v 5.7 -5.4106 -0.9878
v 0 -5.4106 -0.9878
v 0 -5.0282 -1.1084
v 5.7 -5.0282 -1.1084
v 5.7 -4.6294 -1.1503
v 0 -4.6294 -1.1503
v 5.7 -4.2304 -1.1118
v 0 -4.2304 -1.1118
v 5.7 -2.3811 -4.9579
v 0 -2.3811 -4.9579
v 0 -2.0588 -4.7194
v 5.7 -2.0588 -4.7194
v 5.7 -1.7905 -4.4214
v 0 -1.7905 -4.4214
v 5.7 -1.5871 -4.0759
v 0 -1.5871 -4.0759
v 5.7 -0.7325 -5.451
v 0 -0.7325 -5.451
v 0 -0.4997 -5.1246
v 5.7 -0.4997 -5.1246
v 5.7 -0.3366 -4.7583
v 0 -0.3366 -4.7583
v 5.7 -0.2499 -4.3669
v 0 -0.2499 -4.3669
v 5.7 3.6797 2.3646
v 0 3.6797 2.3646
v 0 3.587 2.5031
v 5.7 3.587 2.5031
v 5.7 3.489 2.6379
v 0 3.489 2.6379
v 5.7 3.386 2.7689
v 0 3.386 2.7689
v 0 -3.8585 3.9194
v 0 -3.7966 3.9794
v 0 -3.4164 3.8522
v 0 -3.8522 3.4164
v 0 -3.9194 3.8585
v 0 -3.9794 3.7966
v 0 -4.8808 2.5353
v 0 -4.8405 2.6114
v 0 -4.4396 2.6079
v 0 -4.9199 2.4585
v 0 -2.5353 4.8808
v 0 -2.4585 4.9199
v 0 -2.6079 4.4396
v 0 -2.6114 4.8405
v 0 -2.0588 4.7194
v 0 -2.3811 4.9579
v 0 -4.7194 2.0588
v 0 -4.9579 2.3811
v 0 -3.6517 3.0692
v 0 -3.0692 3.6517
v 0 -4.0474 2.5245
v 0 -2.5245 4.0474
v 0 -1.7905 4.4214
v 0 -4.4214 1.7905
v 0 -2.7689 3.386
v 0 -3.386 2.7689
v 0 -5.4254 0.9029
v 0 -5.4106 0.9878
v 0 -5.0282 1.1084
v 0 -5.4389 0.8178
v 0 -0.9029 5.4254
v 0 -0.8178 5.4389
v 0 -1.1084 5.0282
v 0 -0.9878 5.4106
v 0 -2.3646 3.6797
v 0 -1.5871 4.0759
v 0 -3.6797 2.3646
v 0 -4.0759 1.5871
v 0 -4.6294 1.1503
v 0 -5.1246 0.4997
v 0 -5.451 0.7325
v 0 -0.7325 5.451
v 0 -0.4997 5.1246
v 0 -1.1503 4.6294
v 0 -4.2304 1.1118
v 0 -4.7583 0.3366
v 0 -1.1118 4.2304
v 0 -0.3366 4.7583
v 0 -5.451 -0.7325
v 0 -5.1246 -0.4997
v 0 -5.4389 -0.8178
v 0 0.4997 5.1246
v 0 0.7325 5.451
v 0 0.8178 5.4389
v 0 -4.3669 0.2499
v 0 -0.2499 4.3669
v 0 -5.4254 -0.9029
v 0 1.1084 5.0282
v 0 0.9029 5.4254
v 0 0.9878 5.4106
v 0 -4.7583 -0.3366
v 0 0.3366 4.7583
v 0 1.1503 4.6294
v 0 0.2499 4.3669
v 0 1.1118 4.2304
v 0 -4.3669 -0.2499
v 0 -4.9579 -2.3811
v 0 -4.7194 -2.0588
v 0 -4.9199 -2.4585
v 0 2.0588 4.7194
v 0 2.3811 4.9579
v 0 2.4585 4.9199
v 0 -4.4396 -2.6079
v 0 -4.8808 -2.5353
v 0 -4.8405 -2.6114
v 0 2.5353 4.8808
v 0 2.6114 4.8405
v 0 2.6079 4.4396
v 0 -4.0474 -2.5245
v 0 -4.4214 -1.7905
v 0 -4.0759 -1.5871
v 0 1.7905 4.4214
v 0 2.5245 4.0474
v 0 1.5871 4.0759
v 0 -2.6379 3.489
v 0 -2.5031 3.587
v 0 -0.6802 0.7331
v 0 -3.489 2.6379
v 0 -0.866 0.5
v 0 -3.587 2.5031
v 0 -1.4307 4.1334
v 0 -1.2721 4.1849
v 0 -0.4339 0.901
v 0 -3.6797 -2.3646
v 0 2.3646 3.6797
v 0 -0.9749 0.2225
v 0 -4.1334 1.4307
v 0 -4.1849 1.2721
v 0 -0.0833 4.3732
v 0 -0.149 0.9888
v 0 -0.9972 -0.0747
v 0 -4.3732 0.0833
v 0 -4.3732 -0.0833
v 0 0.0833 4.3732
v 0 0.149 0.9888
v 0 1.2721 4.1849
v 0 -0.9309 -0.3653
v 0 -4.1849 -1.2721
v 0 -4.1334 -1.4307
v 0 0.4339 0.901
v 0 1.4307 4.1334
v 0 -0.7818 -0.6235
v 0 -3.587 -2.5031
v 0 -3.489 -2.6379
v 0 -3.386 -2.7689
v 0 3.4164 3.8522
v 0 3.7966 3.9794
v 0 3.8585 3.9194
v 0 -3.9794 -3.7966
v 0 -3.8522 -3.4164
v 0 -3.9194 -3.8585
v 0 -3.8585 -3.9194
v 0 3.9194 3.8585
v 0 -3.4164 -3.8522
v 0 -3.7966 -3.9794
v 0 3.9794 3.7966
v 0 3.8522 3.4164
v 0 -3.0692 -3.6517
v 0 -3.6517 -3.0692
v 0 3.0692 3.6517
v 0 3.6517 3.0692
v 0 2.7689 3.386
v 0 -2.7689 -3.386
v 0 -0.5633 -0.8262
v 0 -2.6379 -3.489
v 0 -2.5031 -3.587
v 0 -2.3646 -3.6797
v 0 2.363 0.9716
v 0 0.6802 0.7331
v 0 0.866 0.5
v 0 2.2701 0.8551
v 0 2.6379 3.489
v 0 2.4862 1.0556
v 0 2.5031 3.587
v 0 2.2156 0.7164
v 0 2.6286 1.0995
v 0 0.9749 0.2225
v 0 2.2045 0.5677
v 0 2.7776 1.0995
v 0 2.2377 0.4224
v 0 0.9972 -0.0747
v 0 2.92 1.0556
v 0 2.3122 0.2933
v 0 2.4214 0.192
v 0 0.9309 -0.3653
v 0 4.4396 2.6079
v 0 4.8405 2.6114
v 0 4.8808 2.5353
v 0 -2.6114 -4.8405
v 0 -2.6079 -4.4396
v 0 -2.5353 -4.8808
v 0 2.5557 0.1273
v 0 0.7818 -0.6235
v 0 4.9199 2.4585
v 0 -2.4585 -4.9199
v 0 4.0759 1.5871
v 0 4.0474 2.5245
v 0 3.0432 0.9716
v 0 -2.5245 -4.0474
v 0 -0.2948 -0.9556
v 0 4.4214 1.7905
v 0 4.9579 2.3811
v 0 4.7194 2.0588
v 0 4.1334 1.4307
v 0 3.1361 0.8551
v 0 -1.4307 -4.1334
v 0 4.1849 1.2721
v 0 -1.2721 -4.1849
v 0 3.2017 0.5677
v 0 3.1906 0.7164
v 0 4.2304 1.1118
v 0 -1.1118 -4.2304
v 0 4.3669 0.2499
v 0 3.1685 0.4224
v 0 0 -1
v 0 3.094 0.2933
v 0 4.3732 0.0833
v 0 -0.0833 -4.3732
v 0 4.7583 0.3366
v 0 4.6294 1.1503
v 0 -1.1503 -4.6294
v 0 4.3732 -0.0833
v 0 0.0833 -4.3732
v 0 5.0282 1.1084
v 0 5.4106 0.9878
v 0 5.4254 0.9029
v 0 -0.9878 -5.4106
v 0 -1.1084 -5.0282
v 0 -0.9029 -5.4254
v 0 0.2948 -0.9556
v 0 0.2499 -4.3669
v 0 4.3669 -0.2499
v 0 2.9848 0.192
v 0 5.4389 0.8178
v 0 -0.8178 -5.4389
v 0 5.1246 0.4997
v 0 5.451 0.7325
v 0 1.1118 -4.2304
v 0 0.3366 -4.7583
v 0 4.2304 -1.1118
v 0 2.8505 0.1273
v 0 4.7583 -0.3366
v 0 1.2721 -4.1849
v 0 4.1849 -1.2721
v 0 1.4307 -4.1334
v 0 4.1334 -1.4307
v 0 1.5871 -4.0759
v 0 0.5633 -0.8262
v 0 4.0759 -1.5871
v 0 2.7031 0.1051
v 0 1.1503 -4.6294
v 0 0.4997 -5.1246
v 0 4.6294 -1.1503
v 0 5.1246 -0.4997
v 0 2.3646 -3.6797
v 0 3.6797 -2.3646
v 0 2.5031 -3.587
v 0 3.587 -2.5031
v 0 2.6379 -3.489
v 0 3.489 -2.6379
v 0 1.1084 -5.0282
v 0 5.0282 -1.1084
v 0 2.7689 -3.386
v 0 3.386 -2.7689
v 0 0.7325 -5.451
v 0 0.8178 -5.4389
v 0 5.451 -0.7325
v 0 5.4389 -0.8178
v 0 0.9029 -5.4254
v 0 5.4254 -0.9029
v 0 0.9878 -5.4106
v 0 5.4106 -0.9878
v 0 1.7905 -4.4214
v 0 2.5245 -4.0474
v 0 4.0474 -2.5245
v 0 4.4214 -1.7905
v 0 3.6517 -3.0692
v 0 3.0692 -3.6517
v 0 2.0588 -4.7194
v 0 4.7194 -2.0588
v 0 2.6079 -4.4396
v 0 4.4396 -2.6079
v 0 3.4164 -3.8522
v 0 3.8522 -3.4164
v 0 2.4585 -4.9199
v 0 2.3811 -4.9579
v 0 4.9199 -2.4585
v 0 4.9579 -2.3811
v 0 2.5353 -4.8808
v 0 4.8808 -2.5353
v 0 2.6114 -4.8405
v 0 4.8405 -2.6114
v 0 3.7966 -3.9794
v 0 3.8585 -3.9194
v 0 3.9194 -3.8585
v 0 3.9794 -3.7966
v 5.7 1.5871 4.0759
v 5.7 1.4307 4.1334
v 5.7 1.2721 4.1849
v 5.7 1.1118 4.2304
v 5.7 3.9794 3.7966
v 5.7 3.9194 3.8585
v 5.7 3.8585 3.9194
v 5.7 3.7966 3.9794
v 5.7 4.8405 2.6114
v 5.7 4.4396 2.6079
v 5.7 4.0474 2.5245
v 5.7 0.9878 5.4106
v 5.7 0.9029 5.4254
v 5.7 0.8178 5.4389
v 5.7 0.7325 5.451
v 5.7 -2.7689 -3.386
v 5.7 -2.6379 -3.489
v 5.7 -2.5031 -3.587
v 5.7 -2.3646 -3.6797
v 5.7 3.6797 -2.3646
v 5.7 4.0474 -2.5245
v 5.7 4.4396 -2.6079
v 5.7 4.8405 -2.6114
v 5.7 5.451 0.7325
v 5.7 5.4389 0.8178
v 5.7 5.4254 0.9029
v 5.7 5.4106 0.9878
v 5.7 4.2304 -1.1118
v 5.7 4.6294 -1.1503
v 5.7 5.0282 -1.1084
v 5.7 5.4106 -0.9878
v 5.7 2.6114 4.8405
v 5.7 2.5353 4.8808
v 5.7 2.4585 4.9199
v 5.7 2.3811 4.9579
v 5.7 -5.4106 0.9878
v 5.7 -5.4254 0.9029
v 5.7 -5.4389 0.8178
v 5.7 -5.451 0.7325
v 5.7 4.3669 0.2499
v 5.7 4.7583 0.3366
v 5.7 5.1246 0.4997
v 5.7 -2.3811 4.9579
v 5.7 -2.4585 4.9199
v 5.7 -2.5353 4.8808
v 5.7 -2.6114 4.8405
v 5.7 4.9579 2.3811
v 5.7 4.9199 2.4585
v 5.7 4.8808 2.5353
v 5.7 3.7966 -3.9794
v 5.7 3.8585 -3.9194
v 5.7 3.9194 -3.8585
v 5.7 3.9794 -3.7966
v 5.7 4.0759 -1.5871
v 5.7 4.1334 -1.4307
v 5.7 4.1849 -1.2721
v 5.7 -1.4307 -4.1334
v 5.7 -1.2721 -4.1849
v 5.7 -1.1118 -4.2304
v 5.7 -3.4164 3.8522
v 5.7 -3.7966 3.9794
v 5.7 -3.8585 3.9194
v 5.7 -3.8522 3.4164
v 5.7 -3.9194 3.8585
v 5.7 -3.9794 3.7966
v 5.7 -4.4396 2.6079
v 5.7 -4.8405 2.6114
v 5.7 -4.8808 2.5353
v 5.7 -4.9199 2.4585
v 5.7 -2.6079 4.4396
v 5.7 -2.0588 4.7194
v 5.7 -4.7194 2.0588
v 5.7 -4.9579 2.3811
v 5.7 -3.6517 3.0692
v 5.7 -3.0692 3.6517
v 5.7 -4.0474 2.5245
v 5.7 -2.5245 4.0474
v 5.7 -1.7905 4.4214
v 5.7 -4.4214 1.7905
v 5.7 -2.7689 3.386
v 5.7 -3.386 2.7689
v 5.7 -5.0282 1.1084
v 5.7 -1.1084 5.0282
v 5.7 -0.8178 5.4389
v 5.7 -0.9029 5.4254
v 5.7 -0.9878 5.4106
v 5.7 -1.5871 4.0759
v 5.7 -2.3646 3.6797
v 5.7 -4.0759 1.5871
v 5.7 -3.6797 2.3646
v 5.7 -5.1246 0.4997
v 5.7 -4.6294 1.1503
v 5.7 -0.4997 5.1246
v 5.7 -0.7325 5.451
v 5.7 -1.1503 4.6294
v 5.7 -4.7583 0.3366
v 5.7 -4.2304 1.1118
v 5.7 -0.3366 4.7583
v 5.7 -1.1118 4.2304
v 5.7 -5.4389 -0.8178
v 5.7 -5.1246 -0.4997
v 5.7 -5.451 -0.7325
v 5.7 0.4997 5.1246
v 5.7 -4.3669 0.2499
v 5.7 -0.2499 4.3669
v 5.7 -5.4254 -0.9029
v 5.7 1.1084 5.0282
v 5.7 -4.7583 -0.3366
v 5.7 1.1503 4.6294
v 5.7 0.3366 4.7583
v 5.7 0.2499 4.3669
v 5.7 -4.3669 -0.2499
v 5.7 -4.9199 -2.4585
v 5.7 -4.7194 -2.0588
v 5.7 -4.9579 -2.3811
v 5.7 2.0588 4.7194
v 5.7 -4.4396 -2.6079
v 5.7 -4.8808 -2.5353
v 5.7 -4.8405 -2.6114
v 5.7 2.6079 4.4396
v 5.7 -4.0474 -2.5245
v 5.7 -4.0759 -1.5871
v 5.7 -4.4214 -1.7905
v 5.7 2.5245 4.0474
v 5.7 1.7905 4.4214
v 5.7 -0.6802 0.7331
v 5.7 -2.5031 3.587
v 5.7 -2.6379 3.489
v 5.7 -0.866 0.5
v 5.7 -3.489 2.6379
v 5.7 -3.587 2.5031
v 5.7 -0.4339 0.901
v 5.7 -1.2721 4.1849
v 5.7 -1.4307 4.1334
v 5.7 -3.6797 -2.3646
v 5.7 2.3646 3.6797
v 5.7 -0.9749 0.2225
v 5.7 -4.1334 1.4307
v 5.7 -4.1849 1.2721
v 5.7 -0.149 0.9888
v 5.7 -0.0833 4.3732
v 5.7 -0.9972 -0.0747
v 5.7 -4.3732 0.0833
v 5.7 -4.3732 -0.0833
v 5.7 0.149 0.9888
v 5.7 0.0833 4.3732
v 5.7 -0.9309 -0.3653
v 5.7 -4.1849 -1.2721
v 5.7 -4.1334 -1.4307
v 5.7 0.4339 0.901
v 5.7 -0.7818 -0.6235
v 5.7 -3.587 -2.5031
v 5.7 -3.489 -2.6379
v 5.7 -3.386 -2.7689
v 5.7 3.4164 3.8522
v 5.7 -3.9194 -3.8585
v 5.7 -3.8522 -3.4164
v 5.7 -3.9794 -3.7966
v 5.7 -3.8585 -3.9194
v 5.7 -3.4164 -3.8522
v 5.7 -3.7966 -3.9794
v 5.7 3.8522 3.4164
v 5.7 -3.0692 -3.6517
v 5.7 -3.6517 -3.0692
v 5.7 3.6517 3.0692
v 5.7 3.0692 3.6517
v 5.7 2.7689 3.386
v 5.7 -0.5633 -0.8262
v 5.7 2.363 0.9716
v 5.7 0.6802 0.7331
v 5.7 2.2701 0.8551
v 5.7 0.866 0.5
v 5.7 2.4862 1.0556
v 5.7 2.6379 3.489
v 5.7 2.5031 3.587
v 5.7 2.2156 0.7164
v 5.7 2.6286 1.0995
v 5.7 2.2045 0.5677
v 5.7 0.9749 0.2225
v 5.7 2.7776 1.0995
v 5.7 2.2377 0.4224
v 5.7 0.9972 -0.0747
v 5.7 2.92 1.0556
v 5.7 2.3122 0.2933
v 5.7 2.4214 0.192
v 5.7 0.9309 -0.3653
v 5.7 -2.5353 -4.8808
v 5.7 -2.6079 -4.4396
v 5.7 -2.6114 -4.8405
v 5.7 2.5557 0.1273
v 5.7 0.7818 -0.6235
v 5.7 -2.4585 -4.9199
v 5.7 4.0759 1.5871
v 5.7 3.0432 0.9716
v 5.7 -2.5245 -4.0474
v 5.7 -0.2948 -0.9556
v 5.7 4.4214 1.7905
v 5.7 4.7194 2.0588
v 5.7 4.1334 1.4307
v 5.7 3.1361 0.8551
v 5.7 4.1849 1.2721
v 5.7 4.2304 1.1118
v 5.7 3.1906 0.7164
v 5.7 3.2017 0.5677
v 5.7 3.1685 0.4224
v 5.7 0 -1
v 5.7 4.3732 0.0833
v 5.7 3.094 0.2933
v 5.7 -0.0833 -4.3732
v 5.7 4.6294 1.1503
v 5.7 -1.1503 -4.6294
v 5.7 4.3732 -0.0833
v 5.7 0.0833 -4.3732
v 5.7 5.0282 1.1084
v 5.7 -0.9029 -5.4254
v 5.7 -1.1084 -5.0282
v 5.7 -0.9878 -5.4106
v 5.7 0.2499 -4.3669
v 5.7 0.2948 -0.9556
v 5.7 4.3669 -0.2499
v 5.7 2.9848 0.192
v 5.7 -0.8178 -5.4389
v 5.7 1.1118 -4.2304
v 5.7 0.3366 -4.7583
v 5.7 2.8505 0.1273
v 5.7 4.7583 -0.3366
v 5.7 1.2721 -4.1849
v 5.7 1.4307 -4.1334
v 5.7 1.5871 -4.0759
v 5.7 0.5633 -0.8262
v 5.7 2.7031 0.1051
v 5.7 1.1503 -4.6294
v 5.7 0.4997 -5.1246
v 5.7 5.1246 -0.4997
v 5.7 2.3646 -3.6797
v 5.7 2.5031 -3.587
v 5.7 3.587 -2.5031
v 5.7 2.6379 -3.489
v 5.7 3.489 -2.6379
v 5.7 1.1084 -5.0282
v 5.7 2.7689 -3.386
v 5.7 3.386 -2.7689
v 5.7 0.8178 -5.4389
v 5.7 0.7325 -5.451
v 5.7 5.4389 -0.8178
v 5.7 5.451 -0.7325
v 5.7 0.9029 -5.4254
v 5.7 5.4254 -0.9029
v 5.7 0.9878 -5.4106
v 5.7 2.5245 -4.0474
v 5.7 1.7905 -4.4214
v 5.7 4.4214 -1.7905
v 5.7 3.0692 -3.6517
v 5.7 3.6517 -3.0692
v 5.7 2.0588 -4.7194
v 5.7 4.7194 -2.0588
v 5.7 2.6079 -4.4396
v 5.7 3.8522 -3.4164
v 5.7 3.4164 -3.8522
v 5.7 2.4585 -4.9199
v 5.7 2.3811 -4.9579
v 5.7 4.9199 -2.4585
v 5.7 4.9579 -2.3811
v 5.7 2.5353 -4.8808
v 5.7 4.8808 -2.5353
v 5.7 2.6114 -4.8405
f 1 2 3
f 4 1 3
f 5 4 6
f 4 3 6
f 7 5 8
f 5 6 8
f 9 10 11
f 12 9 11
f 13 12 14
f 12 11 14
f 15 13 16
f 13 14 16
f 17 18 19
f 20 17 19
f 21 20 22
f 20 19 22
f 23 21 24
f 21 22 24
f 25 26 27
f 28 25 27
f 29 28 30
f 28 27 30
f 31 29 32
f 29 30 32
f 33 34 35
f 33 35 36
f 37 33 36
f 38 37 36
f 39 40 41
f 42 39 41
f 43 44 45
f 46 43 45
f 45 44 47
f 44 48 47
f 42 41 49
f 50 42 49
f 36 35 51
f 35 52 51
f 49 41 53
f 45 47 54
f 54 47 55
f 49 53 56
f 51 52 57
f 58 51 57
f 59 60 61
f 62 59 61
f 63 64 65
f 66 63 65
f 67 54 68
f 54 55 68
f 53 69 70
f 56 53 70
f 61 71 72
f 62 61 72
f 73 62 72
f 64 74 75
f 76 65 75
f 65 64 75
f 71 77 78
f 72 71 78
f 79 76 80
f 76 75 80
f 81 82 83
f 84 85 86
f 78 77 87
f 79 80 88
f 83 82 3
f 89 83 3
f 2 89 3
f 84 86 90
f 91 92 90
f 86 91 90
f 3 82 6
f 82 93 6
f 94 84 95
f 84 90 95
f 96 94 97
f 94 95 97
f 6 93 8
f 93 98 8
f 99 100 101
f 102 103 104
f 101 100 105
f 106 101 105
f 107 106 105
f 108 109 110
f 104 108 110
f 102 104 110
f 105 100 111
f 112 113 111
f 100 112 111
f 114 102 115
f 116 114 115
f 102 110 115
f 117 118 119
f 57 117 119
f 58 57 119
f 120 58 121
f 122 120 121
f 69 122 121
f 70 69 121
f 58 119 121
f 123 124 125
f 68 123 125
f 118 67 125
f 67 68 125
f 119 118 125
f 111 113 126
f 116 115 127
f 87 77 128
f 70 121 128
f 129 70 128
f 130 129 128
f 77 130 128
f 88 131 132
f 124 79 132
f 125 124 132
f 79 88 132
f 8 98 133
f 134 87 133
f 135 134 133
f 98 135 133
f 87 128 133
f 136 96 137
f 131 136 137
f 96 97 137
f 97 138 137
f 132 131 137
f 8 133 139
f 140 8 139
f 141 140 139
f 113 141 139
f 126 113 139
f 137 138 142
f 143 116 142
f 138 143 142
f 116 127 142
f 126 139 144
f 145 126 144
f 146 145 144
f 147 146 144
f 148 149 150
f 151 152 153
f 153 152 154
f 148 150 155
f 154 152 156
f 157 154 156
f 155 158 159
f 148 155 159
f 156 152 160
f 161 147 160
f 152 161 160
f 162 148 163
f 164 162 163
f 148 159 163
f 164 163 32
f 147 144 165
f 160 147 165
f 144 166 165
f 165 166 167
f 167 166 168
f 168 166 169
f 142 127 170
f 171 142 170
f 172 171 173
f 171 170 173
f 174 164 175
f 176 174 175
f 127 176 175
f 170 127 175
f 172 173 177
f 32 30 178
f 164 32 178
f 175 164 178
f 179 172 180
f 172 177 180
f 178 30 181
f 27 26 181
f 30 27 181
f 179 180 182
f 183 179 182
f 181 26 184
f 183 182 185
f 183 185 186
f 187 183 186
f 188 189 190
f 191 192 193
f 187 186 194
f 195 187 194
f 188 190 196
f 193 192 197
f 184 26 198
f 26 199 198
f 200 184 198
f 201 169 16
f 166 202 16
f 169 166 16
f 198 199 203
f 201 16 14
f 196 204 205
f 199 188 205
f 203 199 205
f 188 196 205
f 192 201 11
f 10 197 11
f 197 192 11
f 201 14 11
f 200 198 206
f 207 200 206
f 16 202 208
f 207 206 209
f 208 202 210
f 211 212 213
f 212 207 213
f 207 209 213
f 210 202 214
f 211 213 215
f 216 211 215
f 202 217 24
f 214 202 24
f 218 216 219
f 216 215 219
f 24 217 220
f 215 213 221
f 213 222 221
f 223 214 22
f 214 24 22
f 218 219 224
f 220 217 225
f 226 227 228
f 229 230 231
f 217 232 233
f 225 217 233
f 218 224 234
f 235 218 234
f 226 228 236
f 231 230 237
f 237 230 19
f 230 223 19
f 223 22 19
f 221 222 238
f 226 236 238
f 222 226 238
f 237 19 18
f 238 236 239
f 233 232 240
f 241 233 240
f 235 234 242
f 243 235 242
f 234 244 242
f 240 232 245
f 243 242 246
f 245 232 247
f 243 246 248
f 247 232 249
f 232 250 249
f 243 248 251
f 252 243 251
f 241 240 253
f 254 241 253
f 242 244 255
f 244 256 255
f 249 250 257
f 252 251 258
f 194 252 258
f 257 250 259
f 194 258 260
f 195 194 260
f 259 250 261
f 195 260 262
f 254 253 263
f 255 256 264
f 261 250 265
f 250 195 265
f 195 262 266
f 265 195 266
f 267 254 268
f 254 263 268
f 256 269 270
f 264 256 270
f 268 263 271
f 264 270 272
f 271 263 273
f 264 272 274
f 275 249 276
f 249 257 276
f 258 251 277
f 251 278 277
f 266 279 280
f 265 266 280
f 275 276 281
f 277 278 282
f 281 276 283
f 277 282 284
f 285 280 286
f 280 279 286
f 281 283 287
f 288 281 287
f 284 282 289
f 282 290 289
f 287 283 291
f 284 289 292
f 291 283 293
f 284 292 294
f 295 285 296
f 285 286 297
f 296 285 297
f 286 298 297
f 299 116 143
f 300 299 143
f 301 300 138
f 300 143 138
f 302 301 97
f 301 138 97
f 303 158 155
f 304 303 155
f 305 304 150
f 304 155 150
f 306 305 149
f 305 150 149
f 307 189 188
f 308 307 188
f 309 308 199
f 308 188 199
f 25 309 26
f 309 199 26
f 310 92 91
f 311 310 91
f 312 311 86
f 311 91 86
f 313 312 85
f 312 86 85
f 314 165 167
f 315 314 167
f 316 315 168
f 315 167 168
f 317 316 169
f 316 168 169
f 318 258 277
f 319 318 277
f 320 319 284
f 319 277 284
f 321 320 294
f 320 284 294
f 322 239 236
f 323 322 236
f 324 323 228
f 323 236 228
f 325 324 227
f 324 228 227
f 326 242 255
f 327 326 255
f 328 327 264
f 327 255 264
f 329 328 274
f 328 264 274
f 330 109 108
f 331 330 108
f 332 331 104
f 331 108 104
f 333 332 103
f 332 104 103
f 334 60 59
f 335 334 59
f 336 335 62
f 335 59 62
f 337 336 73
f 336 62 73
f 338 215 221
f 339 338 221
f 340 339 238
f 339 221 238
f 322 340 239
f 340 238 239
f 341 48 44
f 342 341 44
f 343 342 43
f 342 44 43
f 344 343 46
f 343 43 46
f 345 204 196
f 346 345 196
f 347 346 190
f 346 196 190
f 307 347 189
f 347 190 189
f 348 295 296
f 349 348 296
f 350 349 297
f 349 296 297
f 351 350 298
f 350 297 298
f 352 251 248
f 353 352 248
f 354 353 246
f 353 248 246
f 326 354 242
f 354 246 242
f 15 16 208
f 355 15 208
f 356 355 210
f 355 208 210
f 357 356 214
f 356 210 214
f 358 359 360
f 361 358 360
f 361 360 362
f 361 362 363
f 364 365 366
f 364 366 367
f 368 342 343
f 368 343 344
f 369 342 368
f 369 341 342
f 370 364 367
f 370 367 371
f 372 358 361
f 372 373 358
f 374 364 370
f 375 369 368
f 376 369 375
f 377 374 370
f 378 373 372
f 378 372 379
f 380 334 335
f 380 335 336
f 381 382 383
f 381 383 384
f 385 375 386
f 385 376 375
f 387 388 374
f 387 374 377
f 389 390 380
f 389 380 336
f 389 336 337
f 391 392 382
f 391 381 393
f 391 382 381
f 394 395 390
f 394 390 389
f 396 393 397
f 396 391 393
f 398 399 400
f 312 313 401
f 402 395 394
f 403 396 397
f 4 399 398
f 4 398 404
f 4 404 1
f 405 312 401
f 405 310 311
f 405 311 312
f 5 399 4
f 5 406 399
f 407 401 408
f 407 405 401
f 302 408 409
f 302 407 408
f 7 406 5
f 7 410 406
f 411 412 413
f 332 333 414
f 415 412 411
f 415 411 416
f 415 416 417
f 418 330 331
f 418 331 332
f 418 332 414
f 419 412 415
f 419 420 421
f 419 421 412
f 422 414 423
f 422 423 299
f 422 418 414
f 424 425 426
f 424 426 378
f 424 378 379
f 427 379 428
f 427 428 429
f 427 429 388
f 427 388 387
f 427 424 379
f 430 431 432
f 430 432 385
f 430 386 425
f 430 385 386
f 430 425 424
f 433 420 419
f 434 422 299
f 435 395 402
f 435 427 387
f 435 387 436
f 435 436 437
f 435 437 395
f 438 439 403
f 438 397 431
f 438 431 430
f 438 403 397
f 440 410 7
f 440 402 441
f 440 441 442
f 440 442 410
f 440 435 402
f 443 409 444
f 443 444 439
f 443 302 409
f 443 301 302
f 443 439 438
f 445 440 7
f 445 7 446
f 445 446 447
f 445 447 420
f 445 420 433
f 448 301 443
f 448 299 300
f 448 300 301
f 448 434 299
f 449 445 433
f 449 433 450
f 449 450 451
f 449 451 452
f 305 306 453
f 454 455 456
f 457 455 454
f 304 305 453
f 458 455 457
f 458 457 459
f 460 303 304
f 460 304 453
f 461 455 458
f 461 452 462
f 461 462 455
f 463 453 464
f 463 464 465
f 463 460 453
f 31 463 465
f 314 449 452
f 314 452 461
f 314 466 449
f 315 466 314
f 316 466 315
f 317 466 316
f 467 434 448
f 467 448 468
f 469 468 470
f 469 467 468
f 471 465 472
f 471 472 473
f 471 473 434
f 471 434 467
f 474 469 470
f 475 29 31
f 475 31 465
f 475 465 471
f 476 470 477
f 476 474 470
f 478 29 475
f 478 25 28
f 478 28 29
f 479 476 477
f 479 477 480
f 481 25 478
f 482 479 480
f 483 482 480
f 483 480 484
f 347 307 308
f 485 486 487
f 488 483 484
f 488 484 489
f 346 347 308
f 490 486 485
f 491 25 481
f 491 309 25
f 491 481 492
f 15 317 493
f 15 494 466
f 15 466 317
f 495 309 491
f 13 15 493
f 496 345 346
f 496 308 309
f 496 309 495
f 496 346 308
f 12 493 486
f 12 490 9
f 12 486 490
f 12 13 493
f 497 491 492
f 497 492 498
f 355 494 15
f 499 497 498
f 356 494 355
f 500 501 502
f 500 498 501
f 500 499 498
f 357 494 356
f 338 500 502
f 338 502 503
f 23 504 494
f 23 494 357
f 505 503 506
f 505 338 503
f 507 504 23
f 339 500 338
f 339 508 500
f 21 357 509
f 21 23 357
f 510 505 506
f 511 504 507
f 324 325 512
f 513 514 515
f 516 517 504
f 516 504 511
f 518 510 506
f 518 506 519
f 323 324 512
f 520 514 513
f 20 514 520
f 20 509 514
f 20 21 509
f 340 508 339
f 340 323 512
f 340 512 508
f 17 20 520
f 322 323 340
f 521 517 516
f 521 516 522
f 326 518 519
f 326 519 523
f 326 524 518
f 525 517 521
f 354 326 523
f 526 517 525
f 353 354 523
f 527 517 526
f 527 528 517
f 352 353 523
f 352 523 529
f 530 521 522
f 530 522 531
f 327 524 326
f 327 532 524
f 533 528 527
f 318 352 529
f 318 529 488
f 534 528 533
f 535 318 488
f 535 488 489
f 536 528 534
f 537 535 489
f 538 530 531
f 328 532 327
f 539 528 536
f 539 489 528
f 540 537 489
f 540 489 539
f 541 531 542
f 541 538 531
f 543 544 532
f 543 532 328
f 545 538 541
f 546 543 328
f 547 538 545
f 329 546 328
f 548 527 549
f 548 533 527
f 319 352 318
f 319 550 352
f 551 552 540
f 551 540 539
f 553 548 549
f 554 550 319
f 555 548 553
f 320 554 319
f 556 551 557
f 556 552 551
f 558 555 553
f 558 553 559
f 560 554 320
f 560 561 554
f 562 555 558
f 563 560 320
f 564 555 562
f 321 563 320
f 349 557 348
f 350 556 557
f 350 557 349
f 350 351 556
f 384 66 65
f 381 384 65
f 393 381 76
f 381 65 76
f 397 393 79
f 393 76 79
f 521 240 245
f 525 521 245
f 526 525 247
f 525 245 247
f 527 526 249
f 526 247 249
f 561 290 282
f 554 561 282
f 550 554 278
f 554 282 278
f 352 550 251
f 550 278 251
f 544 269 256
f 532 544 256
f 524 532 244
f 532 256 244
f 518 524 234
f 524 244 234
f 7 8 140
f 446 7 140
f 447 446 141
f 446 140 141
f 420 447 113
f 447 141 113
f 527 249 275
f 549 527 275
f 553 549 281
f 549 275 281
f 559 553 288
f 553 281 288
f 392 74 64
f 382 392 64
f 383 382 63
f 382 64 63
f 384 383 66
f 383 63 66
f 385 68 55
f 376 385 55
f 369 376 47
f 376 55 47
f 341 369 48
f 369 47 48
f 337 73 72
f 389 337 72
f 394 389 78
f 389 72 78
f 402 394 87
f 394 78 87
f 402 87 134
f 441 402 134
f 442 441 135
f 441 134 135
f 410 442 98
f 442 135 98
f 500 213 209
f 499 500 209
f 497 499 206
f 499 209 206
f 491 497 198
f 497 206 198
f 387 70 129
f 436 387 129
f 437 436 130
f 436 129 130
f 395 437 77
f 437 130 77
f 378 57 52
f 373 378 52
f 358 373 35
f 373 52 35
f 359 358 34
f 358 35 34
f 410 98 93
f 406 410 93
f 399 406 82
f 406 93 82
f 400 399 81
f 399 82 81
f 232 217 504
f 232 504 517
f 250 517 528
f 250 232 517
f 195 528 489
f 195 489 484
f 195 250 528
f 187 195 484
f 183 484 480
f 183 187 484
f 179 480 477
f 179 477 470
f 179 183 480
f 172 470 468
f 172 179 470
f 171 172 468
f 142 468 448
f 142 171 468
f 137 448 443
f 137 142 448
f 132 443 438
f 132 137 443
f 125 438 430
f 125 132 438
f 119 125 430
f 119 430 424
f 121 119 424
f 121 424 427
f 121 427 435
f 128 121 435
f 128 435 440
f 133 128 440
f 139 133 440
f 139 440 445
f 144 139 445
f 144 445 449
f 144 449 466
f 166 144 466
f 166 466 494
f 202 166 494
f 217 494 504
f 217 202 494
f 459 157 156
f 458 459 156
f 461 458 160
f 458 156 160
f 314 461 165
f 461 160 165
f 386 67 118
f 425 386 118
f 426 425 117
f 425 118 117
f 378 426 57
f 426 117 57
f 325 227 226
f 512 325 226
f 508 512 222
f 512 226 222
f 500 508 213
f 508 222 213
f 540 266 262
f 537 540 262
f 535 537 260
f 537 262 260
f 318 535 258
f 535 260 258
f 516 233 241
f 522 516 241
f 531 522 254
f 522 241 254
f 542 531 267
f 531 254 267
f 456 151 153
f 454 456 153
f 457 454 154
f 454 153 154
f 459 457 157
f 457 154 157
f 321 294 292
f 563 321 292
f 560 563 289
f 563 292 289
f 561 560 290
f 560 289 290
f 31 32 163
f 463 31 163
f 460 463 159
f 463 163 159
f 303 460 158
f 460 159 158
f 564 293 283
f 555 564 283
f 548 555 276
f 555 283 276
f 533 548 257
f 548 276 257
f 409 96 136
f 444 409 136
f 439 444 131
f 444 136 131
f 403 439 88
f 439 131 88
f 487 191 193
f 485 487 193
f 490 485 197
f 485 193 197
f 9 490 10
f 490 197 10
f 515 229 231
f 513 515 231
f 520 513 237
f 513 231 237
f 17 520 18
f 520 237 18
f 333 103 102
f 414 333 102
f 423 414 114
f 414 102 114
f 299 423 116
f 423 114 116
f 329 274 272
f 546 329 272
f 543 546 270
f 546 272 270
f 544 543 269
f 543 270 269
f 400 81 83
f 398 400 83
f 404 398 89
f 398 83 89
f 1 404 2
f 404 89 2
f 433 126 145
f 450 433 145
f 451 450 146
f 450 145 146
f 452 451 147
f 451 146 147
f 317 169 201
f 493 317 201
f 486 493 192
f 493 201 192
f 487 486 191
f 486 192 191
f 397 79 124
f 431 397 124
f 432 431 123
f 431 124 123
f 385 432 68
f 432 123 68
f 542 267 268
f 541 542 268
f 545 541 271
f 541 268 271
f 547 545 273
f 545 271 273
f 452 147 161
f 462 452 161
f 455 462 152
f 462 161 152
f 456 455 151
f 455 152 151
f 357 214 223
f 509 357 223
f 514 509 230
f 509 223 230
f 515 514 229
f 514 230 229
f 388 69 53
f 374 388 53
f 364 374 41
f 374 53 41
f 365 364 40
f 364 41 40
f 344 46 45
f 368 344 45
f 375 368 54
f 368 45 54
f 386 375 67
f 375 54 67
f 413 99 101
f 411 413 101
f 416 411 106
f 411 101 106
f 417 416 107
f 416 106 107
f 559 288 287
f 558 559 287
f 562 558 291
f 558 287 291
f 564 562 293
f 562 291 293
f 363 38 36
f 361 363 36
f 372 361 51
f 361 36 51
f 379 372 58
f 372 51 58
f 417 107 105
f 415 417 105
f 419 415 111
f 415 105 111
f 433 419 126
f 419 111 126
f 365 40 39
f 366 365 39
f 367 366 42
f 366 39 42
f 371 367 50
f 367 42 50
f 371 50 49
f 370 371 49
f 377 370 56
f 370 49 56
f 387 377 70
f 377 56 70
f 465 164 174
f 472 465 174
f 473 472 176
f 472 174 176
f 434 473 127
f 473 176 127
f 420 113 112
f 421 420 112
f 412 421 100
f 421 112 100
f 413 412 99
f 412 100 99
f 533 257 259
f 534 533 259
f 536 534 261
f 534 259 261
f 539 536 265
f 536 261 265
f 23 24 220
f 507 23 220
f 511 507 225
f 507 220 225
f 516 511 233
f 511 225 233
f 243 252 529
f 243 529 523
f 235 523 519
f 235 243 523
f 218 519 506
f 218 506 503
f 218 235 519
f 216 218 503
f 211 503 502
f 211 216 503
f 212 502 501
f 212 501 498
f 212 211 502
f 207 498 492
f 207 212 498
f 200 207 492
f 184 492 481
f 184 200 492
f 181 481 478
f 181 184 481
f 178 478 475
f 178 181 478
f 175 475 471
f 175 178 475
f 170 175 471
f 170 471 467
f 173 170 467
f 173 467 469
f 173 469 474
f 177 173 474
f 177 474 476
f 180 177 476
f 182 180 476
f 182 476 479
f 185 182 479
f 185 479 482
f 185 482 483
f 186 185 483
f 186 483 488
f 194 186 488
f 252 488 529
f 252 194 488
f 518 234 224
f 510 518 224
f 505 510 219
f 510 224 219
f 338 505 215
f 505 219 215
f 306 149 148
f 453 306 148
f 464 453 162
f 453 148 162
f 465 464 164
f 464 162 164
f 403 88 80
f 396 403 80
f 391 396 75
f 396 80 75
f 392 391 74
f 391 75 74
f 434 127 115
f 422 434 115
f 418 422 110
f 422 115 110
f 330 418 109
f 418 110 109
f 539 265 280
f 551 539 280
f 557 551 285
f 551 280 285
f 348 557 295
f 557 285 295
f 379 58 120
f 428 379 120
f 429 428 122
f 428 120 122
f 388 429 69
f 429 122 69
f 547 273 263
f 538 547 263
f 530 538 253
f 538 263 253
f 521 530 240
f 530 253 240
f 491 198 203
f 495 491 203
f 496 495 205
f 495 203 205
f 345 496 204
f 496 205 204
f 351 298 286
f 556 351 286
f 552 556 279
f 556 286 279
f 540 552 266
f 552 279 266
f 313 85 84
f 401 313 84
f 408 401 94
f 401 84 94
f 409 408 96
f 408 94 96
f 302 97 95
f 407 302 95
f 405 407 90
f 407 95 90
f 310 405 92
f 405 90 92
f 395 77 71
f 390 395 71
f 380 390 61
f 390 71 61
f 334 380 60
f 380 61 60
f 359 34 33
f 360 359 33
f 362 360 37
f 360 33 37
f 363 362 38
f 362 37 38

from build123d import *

# Parameters (mm, degrees)
SKETCH_7_R      = 1
SKETCH_7_R_2    = 0.5
EXTRUDE_3_DEPTH = 5.7


with BuildPart() as part:
    # 草图7 → 凸台-拉伸3 (new body)
    with BuildSketch(Plane(origin=(0, 0, 0), x_dir=(0, 0, -1), z_dir=(1, 0, 0))):
        with BuildLine():
            ThreePointArc((-5.451006848, 0.732478218), (-4.945547363, 0.408928549), (-4.366855207, 0.249903181))
            ThreePointArc((-4.366855207, 0.249903181), (-4.374, 0), (-4.366855207, -0.249903181))
            ThreePointArc((-4.366855207, -0.249903181), (-4.945547363, -0.408928549), (-5.451006848, -0.732478218))
            ThreePointArc((-5.451006848, -0.732478218), (-5.432285873, -0.860389558), (-5.410563801, -0.987825571))
            ThreePointArc((-5.410563801, -0.987825571), (-4.829860918, -1.139344021), (-4.23035043, -1.111760422))
            ThreePointArc((-4.23035043, -1.111760422), (-4.159921202, -1.351640333), (-4.075901771, -1.58710452))
            ThreePointArc((-4.075901771, -1.58710452), (-4.577129176, -1.917172343), (-4.957867366, -2.381081934))
            ThreePointArc((-4.957867366, -2.381081934), (-4.900535883, -2.496947749), (-4.840497071, -2.61143411))
            ThreePointArc((-4.840497071, -2.61143411), (-4.241394034, -2.576089659), (-3.679749479, -2.364597169))
            ThreePointArc((-3.679749479, -2.364597169), (-3.538640333, -2.570972694), (-3.38597067, -2.76894901))
            ThreePointArc((-3.38597067, -2.76894901), (-3.760669693, -3.23774995), (-3.979417283, -3.796608762))
            ThreePointArc((-3.979417283, -3.796608762), (-3.889087297, -3.889087297), (-3.796608762, -3.979417283))
            ThreePointArc((-3.796608762, -3.979417283), (-3.23774995, -3.760669693), (-2.76894901, -3.38597067))
            ThreePointArc((-2.76894901, -3.38597067), (-2.570972694, -3.538640333), (-2.364597169, -3.679749479))
            ThreePointArc((-2.364597169, -3.679749479), (-2.576089659, -4.241394034), (-2.61143411, -4.840497071))
            ThreePointArc((-2.61143411, -4.840497071), (-2.496947749, -4.900535883), (-2.381081934, -4.957867366))
            ThreePointArc((-2.381081934, -4.957867366), (-1.917172343, -4.577129176), (-1.58710452, -4.075901771))
            ThreePointArc((-1.58710452, -4.075901771), (-1.351640333, -4.159921202), (-1.111760422, -4.23035043))
            ThreePointArc((-1.111760422, -4.23035043), (-1.139344021, -4.829860918), (-0.987825571, -5.410563801))
            ThreePointArc((-0.987825571, -5.410563801), (-0.860389558, -5.432285873), (-0.732478218, -5.451006848))
            ThreePointArc((-0.732478218, -5.451006848), (-0.408928549, -4.945547363), (-0.249903181, -4.366855207))
            ThreePointArc((-0.249903181, -4.366855207), (0, -4.374), (0.249903181, -4.366855207))
            ThreePointArc((0.249903181, -4.366855207), (0.408928549, -4.945547363), (0.732478218, -5.451006848))
            ThreePointArc((0.732478218, -5.451006848), (0.860389558, -5.432285873), (0.987825571, -5.410563801))
            ThreePointArc((0.987825571, -5.410563801), (1.139344021, -4.829860918), (1.111760422, -4.23035043))
            ThreePointArc((1.111760422, -4.23035043), (1.351640333, -4.159921202), (1.58710452, -4.075901771))
            ThreePointArc((1.58710452, -4.075901771), (1.917172343, -4.577129176), (2.381081934, -4.957867366))
            ThreePointArc((2.381081934, -4.957867366), (2.496947749, -4.900535883), (2.61143411, -4.840497071))
            ThreePointArc((2.61143411, -4.840497071), (2.576089659, -4.241394034), (2.364597169, -3.679749479))
            ThreePointArc((2.364597169, -3.679749479), (2.570972694, -3.538640333), (2.76894901, -3.38597067))
            ThreePointArc((2.76894901, -3.38597067), (3.23774995, -3.760669693), (3.796608762, -3.979417283))
            ThreePointArc((3.796608762, -3.979417283), (3.889087297, -3.889087297), (3.979417283, -3.796608762))
            ThreePointArc((3.979417283, -3.796608762), (3.760669693, -3.23774995), (3.38597067, -2.76894901))
            ThreePointArc((3.38597067, -2.76894901), (3.538640333, -2.570972694), (3.679749479, -2.364597169))
            ThreePointArc((3.679749479, -2.364597169), (4.241394034, -2.576089659), (4.840497071, -2.61143411))
            ThreePointArc((4.840497071, -2.61143411), (4.900535883, -2.496947749), (4.957867366, -2.381081934))
            ThreePointArc((4.957867366, -2.381081934), (4.577129176, -1.917172343), (4.075901771, -1.58710452))
            ThreePointArc((4.075901771, -1.58710452), (4.159921202, -1.351640333), (4.23035043, -1.111760422))
            ThreePointArc((4.23035043, -1.111760422), (4.829860918, -1.139344021), (5.410563801, -0.987825571))
            ThreePointArc((5.410563801, -0.987825571), (5.432285873, -0.860389558), (5.451006848, -0.732478218))
            ThreePointArc((5.451006848, -0.732478218), (4.945547363, -0.408928549), (4.366855207, -0.249903181))
            ThreePointArc((4.366855207, -0.249903181), (4.374, 0), (4.366855207, 0.249903181))
            ThreePointArc((4.366855207, 0.249903181), (4.945547363, 0.408928549), (5.451006848, 0.732478218))
            ThreePointArc((5.451006848, 0.732478218), (5.432285873, 0.860389558), (5.410563801, 0.987825571))
            ThreePointArc((5.410563801, 0.987825571), (4.829860918, 1.139344021), (4.23035043, 1.111760422))
            ThreePointArc((4.23035043, 1.111760422), (4.159921202, 1.351640333), (4.075901771, 1.58710452))
            ThreePointArc((4.075901771, 1.58710452), (4.577129176, 1.917172343), (4.957867366, 2.381081934))
            ThreePointArc((4.957867366, 2.381081934), (4.900535883, 2.496947749), (4.840497071, 2.61143411))
            ThreePointArc((4.840497071, 2.61143411), (4.241394034, 2.576089659), (3.679749479, 2.364597169))
            ThreePointArc((3.679749479, 2.364597169), (3.538640333, 2.570972694), (3.38597067, 2.76894901))
            ThreePointArc((3.38597067, 2.76894901), (3.760669693, 3.23774995), (3.979417283, 3.796608762))
            ThreePointArc((3.979417283, 3.796608762), (3.889087297, 3.889087297), (3.796608762, 3.979417283))
            ThreePointArc((3.796608762, 3.979417283), (3.23774995, 3.760669693), (2.76894901, 3.38597067))
            ThreePointArc((2.76894901, 3.38597067), (2.570972694, 3.538640333), (2.364597169, 3.679749479))
            ThreePointArc((2.364597169, 3.679749479), (2.576089659, 4.241394034), (2.61143411, 4.840497071))
            ThreePointArc((2.61143411, 4.840497071), (2.496947749, 4.900535883), (2.381081934, 4.957867366))
            ThreePointArc((2.381081934, 4.957867366), (1.917172343, 4.577129176), (1.58710452, 4.075901771))
            ThreePointArc((1.58710452, 4.075901771), (1.351640333, 4.159921202), (1.111760422, 4.23035043))
            ThreePointArc((1.111760422, 4.23035043), (1.139344021, 4.829860918), (0.987825571, 5.410563801))
            ThreePointArc((0.987825571, 5.410563801), (0.860389558, 5.432285873), (0.732478218, 5.451006848))
            ThreePointArc((0.732478218, 5.451006848), (0.408928549, 4.945547363), (0.249903181, 4.366855207))
            ThreePointArc((0.249903181, 4.366855207), (0, 4.374), (-0.249903181, 4.366855207))
            ThreePointArc((-0.249903181, 4.366855207), (-0.408928549, 4.945547363), (-0.732478218, 5.451006848))
            ThreePointArc((-0.732478218, 5.451006848), (-0.860389558, 5.432285873), (-0.987825571, 5.410563801))
            ThreePointArc((-0.987825571, 5.410563801), (-1.139344021, 4.829860918), (-1.111760422, 4.23035043))
            ThreePointArc((-1.111760422, 4.23035043), (-1.351640333, 4.159921202), (-1.58710452, 4.075901771))
            ThreePointArc((-1.58710452, 4.075901771), (-1.917172343, 4.577129176), (-2.381081934, 4.957867366))
            ThreePointArc((-2.381081934, 4.957867366), (-2.496947749, 4.900535883), (-2.61143411, 4.840497071))
            ThreePointArc((-2.61143411, 4.840497071), (-2.576089659, 4.241394034), (-2.364597169, 3.679749479))
            ThreePointArc((-2.364597169, 3.679749479), (-2.570972694, 3.538640333), (-2.76894901, 3.38597067))
            ThreePointArc((-2.76894901, 3.38597067), (-3.23774995, 3.760669693), (-3.796608762, 3.979417283))
            ThreePointArc((-3.796608762, 3.979417283), (-3.889087297, 3.889087297), (-3.979417283, 3.796608762))
            ThreePointArc((-3.979417283, 3.796608762), (-3.760669693, 3.23774995), (-3.38597067, 2.76894901))
            ThreePointArc((-3.38597067, 2.76894901), (-3.538640333, 2.570972694), (-3.679749479, 2.364597169))
            ThreePointArc((-3.679749479, 2.364597169), (-4.241394034, 2.576089659), (-4.840497071, 2.61143411))
            ThreePointArc((-4.840497071, 2.61143411), (-4.900535883, 2.496947749), (-4.957867366, 2.381081934))
            ThreePointArc((-4.957867366, 2.381081934), (-4.577129176, 1.917172343), (-4.075901771, 1.58710452))
            ThreePointArc((-4.075901771, 1.58710452), (-4.159921202, 1.351640333), (-4.23035043, 1.111760422))
            ThreePointArc((-4.23035043, 1.111760422), (-4.829860918, 1.139344021), (-5.410563801, 0.987825571))
            ThreePointArc((-5.410563801, 0.987825571), (-5.432285873, 0.860389558), (-5.451006848, 0.732478218))
        make_face()
        Circle(SKETCH_7_R, mode=Mode.SUBTRACT)
        with Locations((-0.605093134, 2.703102347)):
            Circle(SKETCH_7_R_2, mode=Mode.SUBTRACT)
    extrude(amount=EXTRUDE_3_DEPTH)


solid = part.part
